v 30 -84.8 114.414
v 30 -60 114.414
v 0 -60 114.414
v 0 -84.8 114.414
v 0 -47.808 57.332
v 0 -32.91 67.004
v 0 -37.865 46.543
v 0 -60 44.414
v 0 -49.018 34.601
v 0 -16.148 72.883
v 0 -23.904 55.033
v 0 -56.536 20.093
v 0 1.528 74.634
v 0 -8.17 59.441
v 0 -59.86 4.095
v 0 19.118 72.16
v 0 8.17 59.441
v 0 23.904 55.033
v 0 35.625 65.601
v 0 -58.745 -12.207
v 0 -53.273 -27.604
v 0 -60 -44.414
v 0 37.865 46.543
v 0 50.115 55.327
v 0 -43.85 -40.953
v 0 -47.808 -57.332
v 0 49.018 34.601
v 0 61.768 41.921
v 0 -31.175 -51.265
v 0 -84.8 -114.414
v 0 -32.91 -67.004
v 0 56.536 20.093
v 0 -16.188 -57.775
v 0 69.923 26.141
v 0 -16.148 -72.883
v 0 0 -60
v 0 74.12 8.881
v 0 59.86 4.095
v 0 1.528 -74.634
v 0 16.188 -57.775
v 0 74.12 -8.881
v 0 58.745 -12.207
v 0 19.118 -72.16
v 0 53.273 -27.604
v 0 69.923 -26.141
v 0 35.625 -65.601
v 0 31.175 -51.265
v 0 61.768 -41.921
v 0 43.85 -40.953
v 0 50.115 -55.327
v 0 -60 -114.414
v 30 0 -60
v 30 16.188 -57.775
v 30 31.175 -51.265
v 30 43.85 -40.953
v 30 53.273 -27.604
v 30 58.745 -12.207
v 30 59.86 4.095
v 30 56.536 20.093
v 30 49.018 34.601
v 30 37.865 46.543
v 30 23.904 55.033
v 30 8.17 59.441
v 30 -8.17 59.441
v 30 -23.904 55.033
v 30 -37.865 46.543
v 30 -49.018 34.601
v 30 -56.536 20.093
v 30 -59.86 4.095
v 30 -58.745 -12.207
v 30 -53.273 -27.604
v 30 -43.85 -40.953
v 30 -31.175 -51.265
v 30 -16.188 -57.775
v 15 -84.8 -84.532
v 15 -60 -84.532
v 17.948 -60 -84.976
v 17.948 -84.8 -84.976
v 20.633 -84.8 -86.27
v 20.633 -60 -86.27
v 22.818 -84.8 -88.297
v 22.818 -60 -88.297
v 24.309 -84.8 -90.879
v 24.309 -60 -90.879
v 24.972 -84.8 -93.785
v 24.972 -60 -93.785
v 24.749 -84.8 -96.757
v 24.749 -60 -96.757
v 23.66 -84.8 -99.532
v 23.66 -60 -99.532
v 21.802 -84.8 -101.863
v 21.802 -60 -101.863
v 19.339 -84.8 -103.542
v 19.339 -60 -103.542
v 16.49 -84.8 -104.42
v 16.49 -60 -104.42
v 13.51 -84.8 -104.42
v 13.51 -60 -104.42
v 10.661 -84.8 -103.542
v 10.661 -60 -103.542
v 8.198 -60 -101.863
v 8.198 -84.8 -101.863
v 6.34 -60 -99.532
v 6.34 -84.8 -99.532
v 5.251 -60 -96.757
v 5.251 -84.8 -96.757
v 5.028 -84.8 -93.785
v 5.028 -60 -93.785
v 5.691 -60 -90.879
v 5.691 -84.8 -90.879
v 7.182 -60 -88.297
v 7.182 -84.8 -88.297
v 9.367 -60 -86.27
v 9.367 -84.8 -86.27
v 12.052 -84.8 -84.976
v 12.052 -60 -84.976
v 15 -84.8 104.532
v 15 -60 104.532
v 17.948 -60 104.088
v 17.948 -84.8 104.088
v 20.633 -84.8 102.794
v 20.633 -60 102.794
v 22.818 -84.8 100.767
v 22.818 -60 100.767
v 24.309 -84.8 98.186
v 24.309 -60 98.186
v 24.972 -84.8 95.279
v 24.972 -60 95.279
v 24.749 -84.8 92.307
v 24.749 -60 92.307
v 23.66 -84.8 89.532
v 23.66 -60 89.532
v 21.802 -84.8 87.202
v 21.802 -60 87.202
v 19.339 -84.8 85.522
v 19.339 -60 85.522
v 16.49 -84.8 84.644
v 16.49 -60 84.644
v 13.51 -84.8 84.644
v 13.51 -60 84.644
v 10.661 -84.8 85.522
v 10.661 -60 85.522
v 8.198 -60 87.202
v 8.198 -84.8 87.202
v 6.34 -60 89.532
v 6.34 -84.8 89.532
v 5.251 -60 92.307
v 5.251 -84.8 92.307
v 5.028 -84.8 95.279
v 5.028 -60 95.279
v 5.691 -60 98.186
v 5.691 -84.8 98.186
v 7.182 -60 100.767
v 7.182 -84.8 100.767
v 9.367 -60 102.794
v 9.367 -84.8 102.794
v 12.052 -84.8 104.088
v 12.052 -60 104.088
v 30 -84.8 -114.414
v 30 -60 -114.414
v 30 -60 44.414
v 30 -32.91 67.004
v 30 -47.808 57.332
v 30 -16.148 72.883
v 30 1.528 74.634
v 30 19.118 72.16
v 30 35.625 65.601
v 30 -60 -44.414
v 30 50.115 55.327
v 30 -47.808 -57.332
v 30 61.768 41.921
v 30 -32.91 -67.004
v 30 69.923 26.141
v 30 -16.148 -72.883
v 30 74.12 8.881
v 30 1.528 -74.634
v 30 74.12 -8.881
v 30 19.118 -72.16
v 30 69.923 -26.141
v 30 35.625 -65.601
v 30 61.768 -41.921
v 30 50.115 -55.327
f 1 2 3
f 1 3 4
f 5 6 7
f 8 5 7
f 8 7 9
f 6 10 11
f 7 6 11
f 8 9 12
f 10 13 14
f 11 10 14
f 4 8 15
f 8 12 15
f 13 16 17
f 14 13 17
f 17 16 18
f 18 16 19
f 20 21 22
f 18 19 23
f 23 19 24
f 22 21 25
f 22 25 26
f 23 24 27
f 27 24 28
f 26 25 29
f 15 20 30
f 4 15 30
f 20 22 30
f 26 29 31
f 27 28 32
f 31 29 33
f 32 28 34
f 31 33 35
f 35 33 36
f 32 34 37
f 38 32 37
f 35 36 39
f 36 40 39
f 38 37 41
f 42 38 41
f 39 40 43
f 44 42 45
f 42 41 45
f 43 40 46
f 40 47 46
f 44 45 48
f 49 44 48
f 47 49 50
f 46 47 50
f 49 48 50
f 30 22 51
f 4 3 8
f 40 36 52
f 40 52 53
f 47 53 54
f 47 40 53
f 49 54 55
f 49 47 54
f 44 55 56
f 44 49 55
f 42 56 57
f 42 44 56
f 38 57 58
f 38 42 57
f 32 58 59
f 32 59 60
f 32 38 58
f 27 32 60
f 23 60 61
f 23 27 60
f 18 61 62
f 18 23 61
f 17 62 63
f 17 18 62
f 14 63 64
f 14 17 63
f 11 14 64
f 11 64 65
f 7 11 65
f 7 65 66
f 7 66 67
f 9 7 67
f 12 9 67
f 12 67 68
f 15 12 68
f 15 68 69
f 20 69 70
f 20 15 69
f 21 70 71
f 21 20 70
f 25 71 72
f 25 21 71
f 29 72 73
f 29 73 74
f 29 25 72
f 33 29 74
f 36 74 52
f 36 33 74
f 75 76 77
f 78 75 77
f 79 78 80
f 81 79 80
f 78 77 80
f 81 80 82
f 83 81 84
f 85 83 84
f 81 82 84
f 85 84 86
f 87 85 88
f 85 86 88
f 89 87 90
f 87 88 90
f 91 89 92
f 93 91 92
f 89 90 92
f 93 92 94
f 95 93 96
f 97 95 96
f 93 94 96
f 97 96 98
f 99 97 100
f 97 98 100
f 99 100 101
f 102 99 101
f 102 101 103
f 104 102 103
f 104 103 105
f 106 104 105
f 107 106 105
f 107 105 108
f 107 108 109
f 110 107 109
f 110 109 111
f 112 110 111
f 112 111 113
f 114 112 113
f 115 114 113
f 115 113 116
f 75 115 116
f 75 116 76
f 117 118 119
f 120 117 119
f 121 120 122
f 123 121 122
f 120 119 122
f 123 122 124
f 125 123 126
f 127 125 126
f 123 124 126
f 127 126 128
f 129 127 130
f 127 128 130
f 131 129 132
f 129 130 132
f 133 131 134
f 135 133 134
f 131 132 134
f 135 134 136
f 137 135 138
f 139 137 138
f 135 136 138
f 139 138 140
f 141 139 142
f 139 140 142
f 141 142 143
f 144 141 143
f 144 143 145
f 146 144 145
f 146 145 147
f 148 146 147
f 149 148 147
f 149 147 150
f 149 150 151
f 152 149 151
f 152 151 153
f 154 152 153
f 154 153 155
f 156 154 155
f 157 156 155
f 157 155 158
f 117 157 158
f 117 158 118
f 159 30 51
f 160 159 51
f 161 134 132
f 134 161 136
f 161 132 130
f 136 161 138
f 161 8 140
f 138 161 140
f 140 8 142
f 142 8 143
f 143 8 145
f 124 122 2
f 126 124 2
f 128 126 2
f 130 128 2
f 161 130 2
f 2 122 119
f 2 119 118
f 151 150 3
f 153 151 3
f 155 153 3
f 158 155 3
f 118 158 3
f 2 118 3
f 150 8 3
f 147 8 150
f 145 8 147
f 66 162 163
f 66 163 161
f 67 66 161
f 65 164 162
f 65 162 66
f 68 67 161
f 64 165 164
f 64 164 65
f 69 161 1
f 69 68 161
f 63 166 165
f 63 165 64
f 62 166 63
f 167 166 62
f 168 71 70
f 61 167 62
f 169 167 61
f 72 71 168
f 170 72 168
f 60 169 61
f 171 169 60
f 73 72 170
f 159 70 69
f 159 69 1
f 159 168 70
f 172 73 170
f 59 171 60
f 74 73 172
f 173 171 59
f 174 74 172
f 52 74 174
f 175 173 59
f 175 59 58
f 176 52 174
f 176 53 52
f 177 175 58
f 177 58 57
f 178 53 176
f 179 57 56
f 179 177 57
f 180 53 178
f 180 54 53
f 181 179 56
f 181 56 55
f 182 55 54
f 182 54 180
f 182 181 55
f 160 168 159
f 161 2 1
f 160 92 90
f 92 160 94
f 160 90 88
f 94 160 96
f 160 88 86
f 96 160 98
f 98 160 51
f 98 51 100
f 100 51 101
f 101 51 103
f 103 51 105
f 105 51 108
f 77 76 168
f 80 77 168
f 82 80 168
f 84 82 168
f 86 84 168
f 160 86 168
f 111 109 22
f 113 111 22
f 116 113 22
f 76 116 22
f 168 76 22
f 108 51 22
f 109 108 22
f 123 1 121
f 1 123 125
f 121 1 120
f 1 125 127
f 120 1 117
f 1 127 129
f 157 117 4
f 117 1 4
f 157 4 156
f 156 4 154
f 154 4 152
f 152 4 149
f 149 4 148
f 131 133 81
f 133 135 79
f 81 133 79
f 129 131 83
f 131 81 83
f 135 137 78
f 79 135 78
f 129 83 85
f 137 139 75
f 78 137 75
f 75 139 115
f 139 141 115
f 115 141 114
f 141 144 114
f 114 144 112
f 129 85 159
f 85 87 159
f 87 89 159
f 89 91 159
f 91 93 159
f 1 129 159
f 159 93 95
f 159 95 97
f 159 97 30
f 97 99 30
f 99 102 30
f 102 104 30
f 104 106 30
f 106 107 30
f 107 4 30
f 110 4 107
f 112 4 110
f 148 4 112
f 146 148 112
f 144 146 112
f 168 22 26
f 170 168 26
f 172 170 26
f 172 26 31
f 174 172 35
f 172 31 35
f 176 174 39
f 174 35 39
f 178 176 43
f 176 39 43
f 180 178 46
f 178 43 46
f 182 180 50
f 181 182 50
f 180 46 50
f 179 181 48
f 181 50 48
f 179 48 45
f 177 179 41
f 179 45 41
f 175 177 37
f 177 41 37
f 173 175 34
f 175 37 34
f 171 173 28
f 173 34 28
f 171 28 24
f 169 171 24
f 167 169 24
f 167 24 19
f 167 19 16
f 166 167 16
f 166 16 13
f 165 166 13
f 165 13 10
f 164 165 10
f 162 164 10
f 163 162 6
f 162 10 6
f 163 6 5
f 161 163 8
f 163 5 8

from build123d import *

# Parameters (mm, degrees)
SKETCH1_R           = 60
BOSS_EXTRUDE1_DEPTH = 30
SKETCH2_R           = 10
CUT_EXTRUDE1_DEPTH  = 180.223980285


with BuildPart() as part:
    # Sketch1 → Boss-Extrude1 (new body)
    with BuildSketch(Plane(origin=(0, 0, 0), x_dir=(0, 0, -1), z_dir=(1, 0, 0))):
        with BuildLine():
            Line((114.414215067, -60), (44.414215067, -60))
            ThreePointArc((44.414215067, -60), (0, 74.65), (-44.414215067, -60))
            Line((-44.414215067, -60), (-114.414215067, -60))
            Line((-114.414215067, -60), (-114.414215067, -84.8))
            Line((-114.414215067, -84.8), (114.414215067, -84.8))
            Line((114.414215067, -84.8), (114.414215067, -60))
        make_face()
        Circle(SKETCH1_R, mode=Mode.SUBTRACT)
    extrude(amount=BOSS_EXTRUDE1_DEPTH)

    # Sketch2 → Cut-Extrude1 (cut, through all)
    with BuildSketch(Plane(origin=(0, -60, 0), x_dir=(1, 0, 0), z_dir=(0, 1, 0))):
        with Locations(Location((15, -94.532107533, 0), (0, 0, 270))):
            Circle(SKETCH2_R)
        with Locations(Location((15, 94.532107533, 0), (0, 0, 270))):
            Circle(SKETCH2_R)
    extrude(amount=-CUT_EXTRUDE1_DEPTH, mode=Mode.SUBTRACT)


solid = part.part
